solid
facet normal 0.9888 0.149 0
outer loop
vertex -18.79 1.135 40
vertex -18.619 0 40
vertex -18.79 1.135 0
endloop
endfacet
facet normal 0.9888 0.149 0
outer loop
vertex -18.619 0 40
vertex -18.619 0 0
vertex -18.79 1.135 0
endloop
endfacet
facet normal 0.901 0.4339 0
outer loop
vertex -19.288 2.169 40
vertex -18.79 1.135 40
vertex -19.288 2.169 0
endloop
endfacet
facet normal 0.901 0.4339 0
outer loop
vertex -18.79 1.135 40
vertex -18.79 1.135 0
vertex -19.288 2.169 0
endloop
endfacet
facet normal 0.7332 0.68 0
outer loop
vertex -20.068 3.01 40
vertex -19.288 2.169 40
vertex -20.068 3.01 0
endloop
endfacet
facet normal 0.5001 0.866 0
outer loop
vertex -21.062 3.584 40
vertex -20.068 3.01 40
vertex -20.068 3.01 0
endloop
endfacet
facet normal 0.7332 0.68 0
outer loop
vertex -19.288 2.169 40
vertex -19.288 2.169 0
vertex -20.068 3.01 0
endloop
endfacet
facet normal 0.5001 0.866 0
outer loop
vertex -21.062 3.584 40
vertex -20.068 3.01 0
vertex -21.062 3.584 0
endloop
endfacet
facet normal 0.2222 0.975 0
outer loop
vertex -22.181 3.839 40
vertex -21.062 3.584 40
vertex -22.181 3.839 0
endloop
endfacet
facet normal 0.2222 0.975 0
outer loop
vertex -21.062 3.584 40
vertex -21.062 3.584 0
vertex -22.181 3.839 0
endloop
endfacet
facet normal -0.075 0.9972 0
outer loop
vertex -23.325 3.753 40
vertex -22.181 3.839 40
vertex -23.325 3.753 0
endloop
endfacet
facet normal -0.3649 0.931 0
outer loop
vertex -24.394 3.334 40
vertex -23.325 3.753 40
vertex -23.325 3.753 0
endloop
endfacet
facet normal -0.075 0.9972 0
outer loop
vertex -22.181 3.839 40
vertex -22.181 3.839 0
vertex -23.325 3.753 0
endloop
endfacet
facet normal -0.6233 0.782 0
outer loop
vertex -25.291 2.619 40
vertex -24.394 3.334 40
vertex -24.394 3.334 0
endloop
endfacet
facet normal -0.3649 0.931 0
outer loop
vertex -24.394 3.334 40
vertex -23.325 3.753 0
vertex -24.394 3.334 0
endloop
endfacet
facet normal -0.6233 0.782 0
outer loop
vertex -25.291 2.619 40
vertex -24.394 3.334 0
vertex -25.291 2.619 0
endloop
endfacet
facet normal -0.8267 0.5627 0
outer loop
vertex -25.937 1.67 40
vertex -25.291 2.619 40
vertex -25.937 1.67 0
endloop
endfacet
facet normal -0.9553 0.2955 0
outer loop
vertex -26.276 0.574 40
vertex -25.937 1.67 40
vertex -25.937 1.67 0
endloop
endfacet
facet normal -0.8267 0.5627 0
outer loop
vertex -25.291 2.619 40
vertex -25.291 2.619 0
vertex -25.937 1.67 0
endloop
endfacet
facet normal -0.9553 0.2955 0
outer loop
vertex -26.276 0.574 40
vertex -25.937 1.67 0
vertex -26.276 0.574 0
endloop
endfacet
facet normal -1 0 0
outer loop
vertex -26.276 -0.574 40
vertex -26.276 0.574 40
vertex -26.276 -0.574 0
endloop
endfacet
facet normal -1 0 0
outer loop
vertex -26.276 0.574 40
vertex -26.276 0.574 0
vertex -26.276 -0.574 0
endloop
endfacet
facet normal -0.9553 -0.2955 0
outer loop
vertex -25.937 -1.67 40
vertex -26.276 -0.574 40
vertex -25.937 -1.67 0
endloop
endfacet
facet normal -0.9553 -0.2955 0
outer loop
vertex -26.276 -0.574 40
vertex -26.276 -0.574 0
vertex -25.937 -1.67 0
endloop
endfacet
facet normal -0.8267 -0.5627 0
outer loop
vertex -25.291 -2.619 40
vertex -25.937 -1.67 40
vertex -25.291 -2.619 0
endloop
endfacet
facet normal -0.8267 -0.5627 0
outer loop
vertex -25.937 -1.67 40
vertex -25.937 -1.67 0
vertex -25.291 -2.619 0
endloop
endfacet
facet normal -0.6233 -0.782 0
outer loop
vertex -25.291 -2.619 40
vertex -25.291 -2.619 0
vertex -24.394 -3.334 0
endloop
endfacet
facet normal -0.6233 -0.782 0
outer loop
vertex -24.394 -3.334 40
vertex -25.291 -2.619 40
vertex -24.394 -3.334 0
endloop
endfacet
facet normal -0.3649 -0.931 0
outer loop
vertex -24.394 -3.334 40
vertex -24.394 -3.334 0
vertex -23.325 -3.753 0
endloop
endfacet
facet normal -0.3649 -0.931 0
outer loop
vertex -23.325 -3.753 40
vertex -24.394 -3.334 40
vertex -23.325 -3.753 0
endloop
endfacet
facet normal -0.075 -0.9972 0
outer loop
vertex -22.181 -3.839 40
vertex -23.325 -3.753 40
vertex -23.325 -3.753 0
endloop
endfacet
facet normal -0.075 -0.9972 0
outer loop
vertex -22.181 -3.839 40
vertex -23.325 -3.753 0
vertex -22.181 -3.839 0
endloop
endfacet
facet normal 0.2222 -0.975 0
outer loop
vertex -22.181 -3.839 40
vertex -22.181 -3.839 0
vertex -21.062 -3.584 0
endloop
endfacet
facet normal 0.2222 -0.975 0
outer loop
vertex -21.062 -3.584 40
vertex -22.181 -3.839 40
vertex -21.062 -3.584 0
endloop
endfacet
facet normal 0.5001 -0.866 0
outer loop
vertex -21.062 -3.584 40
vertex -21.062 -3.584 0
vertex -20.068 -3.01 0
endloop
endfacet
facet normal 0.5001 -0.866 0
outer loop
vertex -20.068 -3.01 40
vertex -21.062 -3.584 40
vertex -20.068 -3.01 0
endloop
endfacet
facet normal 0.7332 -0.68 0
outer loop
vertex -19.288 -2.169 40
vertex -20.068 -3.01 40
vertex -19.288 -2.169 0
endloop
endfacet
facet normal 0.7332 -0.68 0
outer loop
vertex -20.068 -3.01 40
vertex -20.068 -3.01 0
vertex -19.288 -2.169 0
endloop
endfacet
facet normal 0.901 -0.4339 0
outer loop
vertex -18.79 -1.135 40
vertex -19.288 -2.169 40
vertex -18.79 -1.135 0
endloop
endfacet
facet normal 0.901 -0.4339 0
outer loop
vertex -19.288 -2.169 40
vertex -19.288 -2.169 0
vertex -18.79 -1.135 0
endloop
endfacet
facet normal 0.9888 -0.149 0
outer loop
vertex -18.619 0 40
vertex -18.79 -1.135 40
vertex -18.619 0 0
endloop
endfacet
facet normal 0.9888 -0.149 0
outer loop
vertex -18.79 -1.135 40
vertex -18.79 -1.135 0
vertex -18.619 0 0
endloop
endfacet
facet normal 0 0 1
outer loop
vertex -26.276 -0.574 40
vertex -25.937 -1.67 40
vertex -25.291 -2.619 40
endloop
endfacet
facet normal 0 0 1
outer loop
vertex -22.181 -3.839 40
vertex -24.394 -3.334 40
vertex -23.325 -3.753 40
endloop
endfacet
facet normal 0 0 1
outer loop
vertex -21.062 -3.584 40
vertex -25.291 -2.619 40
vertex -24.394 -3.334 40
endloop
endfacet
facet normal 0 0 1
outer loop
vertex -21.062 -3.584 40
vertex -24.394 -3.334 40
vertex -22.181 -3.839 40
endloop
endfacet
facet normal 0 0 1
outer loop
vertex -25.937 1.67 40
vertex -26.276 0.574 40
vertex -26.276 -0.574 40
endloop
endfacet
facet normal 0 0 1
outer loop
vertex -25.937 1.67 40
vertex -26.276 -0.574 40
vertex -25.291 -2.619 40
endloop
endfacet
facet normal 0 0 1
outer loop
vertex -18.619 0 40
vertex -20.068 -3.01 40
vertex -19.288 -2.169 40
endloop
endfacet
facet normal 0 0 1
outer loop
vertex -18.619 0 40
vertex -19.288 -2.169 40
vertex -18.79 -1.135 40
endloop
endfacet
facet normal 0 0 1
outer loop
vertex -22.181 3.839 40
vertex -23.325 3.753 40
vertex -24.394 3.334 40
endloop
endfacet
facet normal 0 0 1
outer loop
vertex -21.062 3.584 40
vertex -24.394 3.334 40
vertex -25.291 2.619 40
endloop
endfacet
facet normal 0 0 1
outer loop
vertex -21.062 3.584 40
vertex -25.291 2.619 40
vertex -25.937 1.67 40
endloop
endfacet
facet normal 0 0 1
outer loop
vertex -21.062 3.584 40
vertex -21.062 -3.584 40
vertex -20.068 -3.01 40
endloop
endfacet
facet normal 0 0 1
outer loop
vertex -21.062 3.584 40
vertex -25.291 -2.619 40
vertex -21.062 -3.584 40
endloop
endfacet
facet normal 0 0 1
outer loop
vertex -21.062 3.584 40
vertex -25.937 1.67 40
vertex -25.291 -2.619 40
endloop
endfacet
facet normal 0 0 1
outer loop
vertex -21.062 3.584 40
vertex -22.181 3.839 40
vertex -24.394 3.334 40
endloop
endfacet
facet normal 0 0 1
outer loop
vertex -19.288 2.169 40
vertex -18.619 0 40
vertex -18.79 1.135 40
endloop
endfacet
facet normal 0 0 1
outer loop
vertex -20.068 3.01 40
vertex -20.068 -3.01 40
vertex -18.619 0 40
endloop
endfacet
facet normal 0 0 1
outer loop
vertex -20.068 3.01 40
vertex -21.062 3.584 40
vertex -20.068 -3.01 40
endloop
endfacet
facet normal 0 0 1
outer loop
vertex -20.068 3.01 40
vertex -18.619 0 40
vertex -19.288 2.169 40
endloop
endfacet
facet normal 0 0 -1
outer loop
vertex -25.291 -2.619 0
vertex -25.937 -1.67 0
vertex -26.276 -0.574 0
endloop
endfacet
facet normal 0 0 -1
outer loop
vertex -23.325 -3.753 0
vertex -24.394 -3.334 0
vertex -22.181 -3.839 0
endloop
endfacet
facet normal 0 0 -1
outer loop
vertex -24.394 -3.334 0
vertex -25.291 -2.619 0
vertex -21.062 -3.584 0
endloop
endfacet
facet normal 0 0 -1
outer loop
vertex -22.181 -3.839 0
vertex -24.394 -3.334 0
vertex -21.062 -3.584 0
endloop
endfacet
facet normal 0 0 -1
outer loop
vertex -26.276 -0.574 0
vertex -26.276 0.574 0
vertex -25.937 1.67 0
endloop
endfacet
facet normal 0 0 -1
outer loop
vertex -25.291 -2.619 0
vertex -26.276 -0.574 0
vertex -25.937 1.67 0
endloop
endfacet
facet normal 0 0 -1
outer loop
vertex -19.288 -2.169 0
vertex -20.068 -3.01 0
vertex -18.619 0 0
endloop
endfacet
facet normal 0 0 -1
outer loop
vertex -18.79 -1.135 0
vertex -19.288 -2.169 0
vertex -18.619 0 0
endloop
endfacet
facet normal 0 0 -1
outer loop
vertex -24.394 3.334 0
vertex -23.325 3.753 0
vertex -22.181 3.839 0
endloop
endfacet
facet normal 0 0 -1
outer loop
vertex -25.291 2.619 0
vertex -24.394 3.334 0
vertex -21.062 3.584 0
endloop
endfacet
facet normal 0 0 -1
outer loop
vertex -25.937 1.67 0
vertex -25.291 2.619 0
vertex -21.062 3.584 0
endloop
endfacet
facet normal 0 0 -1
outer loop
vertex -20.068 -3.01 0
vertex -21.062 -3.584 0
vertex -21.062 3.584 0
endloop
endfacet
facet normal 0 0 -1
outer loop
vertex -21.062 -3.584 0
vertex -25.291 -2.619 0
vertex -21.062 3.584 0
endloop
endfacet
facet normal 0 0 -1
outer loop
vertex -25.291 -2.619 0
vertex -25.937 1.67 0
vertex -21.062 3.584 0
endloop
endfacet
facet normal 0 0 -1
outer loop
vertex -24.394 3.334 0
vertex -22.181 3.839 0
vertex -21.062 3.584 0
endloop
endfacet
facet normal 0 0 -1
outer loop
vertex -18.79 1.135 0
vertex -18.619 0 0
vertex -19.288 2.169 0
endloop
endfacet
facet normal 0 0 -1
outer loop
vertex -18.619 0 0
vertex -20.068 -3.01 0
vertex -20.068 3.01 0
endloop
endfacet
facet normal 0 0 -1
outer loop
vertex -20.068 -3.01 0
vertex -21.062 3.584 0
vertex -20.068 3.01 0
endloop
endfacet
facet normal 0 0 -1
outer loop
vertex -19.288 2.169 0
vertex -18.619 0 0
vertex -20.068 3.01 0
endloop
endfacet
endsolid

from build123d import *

# Parameters (mm, degrees)
F0_R     = 3.85
F1_DEPTH = 25
F2_DEPTH = 10
F3_DEPTH = 15


with BuildPart() as f1:
    # F0 (on Top) → F1 (new body)
    with BuildSketch(Plane.XY):
        Circle(F0_R)
    extrude(amount=F1_DEPTH)


with BuildPart() as f1b:
    # F0 (on Top) → F1, piece 2 (new body)
    with BuildSketch(Plane.XY):
        with Locations((0, -18.7460610834)):
            Circle(F0_R)
    extrude(amount=F1_DEPTH)


with BuildPart() as f1c:
    # F0 (on Top) → F1, piece 3 (new body)
    with BuildSketch(Plane.XY):
        with Locations((-22.4686189292, -18.7460610834)):
            Circle(F0_R)
    extrude(amount=F1_DEPTH)

    # F2 (add): a face of the model
    f2_faces = [f1c.faces().sort_by_distance(p)[0] for p in [
        (-22.4686189292, -18.7460610834, 25),
    ]]
    extrude(f2_faces, amount=F2_DEPTH)


with BuildPart() as f1d:
    # F0 (on Top) → F1, piece 4 (new body)
    with BuildSketch(Plane.XY):
        with Locations((-22.4686189292, 0)):
            Circle(F0_R)
    extrude(amount=F1_DEPTH)

    # F3 (add): a face of the model
    f3_faces = [f1d.faces().sort_by_distance(p)[0] for p in [
        (-22.4686189292, 0, 25),
    ]]
    extrude(f3_faces, amount=F3_DEPTH)


solid = f1d.part
